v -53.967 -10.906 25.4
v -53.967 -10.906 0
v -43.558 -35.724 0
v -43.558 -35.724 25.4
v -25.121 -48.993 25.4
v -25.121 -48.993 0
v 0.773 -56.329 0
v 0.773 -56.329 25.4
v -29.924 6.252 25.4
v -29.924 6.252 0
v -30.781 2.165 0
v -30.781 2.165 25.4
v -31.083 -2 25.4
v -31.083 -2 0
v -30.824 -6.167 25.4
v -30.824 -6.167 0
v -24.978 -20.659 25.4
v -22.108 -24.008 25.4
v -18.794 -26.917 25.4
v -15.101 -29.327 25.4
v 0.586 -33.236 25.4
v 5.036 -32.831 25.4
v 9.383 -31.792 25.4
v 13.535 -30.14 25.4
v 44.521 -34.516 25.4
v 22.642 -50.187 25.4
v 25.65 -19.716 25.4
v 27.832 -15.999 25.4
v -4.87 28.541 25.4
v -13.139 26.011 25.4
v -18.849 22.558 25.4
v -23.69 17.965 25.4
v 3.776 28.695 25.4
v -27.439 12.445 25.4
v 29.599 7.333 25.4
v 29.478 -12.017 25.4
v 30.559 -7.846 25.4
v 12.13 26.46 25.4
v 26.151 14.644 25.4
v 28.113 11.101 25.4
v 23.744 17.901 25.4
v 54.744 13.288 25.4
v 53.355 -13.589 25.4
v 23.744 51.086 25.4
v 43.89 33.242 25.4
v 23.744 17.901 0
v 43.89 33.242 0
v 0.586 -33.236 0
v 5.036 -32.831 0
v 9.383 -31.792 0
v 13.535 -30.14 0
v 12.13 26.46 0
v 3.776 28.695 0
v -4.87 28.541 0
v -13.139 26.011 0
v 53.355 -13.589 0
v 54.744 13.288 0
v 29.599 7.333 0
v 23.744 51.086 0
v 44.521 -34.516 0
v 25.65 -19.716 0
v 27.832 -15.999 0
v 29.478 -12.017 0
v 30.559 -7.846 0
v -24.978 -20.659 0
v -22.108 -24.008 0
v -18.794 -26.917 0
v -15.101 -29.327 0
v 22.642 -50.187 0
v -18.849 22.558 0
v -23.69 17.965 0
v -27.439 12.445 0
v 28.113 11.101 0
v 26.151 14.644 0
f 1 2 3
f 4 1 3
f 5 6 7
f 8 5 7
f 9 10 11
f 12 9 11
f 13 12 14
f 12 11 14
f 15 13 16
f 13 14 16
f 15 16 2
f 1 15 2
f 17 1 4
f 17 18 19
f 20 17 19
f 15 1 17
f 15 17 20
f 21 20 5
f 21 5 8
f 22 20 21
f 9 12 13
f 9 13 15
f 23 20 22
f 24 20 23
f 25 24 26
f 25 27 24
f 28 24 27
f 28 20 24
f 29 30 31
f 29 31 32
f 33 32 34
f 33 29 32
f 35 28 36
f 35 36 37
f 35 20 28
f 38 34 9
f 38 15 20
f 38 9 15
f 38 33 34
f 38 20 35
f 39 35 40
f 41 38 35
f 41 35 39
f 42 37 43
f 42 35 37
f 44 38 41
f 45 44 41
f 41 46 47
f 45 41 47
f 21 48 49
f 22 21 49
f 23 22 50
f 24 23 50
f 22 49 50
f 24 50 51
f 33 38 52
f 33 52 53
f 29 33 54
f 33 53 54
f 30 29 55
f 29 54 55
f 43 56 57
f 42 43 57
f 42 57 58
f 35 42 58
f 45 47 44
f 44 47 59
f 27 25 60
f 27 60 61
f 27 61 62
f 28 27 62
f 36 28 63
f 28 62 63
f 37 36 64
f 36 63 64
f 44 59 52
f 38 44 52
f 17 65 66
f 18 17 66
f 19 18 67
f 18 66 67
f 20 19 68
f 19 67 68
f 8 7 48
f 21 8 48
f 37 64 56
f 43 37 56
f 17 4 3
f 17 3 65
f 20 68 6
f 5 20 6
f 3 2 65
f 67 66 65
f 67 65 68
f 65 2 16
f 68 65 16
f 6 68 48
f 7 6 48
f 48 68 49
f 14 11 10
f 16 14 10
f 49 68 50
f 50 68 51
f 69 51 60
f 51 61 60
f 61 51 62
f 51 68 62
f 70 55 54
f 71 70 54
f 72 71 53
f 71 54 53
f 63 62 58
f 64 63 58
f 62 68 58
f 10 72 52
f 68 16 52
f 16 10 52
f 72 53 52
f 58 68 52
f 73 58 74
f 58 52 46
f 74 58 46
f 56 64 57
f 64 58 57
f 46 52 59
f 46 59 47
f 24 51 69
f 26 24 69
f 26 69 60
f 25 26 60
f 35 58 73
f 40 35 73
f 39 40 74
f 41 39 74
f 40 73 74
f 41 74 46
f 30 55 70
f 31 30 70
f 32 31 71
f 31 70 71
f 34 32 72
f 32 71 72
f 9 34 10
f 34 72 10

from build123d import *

# Parameters (mm, degrees)
F1_DEPTH = 25.4


with BuildPart() as f1:
    # F0 (on Top) → F1 (new body)
    with BuildSketch(Plane.XY):
        with BuildLine():
            ThreePointArc((29.598609, 7.333415), (27.189668, 12.904555), (23.743974, 17.901333))
            ThreePointArc((23.743974, 17.901333), (18.4404, 22.863979), (12.12993, 26.460327))
            ThreePointArc((12.12993, 26.460327), (-0.552402, 28.919903), (-13.139316, 26.011181))
            ThreePointArc((-13.139316, 26.011181), (-23.690129, 17.964895), (-29.92398, 6.251592))
            ThreePointArc((-29.92398, 6.251592), (-31.002085, 0.087719), (-30.823785, -6.167186))
            ThreePointArc((-30.823785, -6.167186), (-28.826395, -13.786695), (-24.977811, -20.659459))
            ThreePointArc((-24.977811, -20.659459), (-20.502768, -25.521151), (-15.101192, -29.327071))
            ThreePointArc((-15.101192, -29.327071), (-7.516447, -32.319411), (0.585505, -33.236383))
            ThreePointArc((0.585505, -33.236383), (7.228176, -32.389792), (13.535374, -30.140119))
            ThreePointArc((13.535374, -30.140119), (20.27418, -25.719795), (25.650061, -19.715574))
            ThreePointArc((25.650061, -19.715574), (28.724195, -14.036908), (30.55867, -7.845603))
            ThreePointArc((30.55867, -7.845603), (30.951906, -5.014149), (31.083355, -2.158543))
            ThreePointArc((31.083355, -2.158543), (30.709925, 2.645147), (29.598609, 7.333415))
        make_face()
        with BuildLine():
            ThreePointArc((12.12993, 26.460327), (18.4404, 22.863979), (23.743974, 17.901333))
            Line((23.743974, 17.901333), (43.890379, 33.241566))
            Line((43.890379, 33.241566), (23.743974, 51.085521))
            Line((23.743974, 51.085521), (12.12993, 26.460327))
        make_face()
        with BuildLine():
            Line((54.744394, 13.287515), (29.598609, 7.333415))
            ThreePointArc((29.598609, 7.333415), (30.709925, 2.645147), (31.083355, -2.158543))
            ThreePointArc((31.083355, -2.158543), (30.951906, -5.014149), (30.55867, -7.845603))
            Line((30.55867, -7.845603), (53.354507, -13.589103))
            Line((53.354507, -13.589103), (54.744394, 13.287515))
        make_face()
        with BuildLine():
            ThreePointArc((-24.977811, -20.659459), (-28.826395, -13.786695), (-30.823785, -6.167186))
            Line((-30.823785, -6.167186), (-53.96684, -10.906294))
            Line((-53.96684, -10.906294), (-43.557758, -35.724339))
            Line((-43.557758, -35.724339), (-24.977811, -20.659459))
        make_face()
        with BuildLine():
            Line((44.521169, -34.516261), (25.650061, -19.715574))
            ThreePointArc((25.650061, -19.715574), (20.27418, -25.719795), (13.535374, -30.140119))
            Line((13.535374, -30.140119), (22.641603, -50.1869))
            Line((22.641603, -50.1869), (44.521169, -34.516261))
        make_face()
        with BuildLine():
            ThreePointArc((0.585505, -33.236383), (-7.516447, -32.319411), (-15.101192, -29.327071))
            Line((-15.101192, -29.327071), (-25.12089, -48.992938))
            Line((-25.12089, -48.992938), (0.772595, -56.328588))
            Line((0.772595, -56.328588), (0.585505, -33.236383))
        make_face()
    extrude(amount=F1_DEPTH)


solid = f1.part
